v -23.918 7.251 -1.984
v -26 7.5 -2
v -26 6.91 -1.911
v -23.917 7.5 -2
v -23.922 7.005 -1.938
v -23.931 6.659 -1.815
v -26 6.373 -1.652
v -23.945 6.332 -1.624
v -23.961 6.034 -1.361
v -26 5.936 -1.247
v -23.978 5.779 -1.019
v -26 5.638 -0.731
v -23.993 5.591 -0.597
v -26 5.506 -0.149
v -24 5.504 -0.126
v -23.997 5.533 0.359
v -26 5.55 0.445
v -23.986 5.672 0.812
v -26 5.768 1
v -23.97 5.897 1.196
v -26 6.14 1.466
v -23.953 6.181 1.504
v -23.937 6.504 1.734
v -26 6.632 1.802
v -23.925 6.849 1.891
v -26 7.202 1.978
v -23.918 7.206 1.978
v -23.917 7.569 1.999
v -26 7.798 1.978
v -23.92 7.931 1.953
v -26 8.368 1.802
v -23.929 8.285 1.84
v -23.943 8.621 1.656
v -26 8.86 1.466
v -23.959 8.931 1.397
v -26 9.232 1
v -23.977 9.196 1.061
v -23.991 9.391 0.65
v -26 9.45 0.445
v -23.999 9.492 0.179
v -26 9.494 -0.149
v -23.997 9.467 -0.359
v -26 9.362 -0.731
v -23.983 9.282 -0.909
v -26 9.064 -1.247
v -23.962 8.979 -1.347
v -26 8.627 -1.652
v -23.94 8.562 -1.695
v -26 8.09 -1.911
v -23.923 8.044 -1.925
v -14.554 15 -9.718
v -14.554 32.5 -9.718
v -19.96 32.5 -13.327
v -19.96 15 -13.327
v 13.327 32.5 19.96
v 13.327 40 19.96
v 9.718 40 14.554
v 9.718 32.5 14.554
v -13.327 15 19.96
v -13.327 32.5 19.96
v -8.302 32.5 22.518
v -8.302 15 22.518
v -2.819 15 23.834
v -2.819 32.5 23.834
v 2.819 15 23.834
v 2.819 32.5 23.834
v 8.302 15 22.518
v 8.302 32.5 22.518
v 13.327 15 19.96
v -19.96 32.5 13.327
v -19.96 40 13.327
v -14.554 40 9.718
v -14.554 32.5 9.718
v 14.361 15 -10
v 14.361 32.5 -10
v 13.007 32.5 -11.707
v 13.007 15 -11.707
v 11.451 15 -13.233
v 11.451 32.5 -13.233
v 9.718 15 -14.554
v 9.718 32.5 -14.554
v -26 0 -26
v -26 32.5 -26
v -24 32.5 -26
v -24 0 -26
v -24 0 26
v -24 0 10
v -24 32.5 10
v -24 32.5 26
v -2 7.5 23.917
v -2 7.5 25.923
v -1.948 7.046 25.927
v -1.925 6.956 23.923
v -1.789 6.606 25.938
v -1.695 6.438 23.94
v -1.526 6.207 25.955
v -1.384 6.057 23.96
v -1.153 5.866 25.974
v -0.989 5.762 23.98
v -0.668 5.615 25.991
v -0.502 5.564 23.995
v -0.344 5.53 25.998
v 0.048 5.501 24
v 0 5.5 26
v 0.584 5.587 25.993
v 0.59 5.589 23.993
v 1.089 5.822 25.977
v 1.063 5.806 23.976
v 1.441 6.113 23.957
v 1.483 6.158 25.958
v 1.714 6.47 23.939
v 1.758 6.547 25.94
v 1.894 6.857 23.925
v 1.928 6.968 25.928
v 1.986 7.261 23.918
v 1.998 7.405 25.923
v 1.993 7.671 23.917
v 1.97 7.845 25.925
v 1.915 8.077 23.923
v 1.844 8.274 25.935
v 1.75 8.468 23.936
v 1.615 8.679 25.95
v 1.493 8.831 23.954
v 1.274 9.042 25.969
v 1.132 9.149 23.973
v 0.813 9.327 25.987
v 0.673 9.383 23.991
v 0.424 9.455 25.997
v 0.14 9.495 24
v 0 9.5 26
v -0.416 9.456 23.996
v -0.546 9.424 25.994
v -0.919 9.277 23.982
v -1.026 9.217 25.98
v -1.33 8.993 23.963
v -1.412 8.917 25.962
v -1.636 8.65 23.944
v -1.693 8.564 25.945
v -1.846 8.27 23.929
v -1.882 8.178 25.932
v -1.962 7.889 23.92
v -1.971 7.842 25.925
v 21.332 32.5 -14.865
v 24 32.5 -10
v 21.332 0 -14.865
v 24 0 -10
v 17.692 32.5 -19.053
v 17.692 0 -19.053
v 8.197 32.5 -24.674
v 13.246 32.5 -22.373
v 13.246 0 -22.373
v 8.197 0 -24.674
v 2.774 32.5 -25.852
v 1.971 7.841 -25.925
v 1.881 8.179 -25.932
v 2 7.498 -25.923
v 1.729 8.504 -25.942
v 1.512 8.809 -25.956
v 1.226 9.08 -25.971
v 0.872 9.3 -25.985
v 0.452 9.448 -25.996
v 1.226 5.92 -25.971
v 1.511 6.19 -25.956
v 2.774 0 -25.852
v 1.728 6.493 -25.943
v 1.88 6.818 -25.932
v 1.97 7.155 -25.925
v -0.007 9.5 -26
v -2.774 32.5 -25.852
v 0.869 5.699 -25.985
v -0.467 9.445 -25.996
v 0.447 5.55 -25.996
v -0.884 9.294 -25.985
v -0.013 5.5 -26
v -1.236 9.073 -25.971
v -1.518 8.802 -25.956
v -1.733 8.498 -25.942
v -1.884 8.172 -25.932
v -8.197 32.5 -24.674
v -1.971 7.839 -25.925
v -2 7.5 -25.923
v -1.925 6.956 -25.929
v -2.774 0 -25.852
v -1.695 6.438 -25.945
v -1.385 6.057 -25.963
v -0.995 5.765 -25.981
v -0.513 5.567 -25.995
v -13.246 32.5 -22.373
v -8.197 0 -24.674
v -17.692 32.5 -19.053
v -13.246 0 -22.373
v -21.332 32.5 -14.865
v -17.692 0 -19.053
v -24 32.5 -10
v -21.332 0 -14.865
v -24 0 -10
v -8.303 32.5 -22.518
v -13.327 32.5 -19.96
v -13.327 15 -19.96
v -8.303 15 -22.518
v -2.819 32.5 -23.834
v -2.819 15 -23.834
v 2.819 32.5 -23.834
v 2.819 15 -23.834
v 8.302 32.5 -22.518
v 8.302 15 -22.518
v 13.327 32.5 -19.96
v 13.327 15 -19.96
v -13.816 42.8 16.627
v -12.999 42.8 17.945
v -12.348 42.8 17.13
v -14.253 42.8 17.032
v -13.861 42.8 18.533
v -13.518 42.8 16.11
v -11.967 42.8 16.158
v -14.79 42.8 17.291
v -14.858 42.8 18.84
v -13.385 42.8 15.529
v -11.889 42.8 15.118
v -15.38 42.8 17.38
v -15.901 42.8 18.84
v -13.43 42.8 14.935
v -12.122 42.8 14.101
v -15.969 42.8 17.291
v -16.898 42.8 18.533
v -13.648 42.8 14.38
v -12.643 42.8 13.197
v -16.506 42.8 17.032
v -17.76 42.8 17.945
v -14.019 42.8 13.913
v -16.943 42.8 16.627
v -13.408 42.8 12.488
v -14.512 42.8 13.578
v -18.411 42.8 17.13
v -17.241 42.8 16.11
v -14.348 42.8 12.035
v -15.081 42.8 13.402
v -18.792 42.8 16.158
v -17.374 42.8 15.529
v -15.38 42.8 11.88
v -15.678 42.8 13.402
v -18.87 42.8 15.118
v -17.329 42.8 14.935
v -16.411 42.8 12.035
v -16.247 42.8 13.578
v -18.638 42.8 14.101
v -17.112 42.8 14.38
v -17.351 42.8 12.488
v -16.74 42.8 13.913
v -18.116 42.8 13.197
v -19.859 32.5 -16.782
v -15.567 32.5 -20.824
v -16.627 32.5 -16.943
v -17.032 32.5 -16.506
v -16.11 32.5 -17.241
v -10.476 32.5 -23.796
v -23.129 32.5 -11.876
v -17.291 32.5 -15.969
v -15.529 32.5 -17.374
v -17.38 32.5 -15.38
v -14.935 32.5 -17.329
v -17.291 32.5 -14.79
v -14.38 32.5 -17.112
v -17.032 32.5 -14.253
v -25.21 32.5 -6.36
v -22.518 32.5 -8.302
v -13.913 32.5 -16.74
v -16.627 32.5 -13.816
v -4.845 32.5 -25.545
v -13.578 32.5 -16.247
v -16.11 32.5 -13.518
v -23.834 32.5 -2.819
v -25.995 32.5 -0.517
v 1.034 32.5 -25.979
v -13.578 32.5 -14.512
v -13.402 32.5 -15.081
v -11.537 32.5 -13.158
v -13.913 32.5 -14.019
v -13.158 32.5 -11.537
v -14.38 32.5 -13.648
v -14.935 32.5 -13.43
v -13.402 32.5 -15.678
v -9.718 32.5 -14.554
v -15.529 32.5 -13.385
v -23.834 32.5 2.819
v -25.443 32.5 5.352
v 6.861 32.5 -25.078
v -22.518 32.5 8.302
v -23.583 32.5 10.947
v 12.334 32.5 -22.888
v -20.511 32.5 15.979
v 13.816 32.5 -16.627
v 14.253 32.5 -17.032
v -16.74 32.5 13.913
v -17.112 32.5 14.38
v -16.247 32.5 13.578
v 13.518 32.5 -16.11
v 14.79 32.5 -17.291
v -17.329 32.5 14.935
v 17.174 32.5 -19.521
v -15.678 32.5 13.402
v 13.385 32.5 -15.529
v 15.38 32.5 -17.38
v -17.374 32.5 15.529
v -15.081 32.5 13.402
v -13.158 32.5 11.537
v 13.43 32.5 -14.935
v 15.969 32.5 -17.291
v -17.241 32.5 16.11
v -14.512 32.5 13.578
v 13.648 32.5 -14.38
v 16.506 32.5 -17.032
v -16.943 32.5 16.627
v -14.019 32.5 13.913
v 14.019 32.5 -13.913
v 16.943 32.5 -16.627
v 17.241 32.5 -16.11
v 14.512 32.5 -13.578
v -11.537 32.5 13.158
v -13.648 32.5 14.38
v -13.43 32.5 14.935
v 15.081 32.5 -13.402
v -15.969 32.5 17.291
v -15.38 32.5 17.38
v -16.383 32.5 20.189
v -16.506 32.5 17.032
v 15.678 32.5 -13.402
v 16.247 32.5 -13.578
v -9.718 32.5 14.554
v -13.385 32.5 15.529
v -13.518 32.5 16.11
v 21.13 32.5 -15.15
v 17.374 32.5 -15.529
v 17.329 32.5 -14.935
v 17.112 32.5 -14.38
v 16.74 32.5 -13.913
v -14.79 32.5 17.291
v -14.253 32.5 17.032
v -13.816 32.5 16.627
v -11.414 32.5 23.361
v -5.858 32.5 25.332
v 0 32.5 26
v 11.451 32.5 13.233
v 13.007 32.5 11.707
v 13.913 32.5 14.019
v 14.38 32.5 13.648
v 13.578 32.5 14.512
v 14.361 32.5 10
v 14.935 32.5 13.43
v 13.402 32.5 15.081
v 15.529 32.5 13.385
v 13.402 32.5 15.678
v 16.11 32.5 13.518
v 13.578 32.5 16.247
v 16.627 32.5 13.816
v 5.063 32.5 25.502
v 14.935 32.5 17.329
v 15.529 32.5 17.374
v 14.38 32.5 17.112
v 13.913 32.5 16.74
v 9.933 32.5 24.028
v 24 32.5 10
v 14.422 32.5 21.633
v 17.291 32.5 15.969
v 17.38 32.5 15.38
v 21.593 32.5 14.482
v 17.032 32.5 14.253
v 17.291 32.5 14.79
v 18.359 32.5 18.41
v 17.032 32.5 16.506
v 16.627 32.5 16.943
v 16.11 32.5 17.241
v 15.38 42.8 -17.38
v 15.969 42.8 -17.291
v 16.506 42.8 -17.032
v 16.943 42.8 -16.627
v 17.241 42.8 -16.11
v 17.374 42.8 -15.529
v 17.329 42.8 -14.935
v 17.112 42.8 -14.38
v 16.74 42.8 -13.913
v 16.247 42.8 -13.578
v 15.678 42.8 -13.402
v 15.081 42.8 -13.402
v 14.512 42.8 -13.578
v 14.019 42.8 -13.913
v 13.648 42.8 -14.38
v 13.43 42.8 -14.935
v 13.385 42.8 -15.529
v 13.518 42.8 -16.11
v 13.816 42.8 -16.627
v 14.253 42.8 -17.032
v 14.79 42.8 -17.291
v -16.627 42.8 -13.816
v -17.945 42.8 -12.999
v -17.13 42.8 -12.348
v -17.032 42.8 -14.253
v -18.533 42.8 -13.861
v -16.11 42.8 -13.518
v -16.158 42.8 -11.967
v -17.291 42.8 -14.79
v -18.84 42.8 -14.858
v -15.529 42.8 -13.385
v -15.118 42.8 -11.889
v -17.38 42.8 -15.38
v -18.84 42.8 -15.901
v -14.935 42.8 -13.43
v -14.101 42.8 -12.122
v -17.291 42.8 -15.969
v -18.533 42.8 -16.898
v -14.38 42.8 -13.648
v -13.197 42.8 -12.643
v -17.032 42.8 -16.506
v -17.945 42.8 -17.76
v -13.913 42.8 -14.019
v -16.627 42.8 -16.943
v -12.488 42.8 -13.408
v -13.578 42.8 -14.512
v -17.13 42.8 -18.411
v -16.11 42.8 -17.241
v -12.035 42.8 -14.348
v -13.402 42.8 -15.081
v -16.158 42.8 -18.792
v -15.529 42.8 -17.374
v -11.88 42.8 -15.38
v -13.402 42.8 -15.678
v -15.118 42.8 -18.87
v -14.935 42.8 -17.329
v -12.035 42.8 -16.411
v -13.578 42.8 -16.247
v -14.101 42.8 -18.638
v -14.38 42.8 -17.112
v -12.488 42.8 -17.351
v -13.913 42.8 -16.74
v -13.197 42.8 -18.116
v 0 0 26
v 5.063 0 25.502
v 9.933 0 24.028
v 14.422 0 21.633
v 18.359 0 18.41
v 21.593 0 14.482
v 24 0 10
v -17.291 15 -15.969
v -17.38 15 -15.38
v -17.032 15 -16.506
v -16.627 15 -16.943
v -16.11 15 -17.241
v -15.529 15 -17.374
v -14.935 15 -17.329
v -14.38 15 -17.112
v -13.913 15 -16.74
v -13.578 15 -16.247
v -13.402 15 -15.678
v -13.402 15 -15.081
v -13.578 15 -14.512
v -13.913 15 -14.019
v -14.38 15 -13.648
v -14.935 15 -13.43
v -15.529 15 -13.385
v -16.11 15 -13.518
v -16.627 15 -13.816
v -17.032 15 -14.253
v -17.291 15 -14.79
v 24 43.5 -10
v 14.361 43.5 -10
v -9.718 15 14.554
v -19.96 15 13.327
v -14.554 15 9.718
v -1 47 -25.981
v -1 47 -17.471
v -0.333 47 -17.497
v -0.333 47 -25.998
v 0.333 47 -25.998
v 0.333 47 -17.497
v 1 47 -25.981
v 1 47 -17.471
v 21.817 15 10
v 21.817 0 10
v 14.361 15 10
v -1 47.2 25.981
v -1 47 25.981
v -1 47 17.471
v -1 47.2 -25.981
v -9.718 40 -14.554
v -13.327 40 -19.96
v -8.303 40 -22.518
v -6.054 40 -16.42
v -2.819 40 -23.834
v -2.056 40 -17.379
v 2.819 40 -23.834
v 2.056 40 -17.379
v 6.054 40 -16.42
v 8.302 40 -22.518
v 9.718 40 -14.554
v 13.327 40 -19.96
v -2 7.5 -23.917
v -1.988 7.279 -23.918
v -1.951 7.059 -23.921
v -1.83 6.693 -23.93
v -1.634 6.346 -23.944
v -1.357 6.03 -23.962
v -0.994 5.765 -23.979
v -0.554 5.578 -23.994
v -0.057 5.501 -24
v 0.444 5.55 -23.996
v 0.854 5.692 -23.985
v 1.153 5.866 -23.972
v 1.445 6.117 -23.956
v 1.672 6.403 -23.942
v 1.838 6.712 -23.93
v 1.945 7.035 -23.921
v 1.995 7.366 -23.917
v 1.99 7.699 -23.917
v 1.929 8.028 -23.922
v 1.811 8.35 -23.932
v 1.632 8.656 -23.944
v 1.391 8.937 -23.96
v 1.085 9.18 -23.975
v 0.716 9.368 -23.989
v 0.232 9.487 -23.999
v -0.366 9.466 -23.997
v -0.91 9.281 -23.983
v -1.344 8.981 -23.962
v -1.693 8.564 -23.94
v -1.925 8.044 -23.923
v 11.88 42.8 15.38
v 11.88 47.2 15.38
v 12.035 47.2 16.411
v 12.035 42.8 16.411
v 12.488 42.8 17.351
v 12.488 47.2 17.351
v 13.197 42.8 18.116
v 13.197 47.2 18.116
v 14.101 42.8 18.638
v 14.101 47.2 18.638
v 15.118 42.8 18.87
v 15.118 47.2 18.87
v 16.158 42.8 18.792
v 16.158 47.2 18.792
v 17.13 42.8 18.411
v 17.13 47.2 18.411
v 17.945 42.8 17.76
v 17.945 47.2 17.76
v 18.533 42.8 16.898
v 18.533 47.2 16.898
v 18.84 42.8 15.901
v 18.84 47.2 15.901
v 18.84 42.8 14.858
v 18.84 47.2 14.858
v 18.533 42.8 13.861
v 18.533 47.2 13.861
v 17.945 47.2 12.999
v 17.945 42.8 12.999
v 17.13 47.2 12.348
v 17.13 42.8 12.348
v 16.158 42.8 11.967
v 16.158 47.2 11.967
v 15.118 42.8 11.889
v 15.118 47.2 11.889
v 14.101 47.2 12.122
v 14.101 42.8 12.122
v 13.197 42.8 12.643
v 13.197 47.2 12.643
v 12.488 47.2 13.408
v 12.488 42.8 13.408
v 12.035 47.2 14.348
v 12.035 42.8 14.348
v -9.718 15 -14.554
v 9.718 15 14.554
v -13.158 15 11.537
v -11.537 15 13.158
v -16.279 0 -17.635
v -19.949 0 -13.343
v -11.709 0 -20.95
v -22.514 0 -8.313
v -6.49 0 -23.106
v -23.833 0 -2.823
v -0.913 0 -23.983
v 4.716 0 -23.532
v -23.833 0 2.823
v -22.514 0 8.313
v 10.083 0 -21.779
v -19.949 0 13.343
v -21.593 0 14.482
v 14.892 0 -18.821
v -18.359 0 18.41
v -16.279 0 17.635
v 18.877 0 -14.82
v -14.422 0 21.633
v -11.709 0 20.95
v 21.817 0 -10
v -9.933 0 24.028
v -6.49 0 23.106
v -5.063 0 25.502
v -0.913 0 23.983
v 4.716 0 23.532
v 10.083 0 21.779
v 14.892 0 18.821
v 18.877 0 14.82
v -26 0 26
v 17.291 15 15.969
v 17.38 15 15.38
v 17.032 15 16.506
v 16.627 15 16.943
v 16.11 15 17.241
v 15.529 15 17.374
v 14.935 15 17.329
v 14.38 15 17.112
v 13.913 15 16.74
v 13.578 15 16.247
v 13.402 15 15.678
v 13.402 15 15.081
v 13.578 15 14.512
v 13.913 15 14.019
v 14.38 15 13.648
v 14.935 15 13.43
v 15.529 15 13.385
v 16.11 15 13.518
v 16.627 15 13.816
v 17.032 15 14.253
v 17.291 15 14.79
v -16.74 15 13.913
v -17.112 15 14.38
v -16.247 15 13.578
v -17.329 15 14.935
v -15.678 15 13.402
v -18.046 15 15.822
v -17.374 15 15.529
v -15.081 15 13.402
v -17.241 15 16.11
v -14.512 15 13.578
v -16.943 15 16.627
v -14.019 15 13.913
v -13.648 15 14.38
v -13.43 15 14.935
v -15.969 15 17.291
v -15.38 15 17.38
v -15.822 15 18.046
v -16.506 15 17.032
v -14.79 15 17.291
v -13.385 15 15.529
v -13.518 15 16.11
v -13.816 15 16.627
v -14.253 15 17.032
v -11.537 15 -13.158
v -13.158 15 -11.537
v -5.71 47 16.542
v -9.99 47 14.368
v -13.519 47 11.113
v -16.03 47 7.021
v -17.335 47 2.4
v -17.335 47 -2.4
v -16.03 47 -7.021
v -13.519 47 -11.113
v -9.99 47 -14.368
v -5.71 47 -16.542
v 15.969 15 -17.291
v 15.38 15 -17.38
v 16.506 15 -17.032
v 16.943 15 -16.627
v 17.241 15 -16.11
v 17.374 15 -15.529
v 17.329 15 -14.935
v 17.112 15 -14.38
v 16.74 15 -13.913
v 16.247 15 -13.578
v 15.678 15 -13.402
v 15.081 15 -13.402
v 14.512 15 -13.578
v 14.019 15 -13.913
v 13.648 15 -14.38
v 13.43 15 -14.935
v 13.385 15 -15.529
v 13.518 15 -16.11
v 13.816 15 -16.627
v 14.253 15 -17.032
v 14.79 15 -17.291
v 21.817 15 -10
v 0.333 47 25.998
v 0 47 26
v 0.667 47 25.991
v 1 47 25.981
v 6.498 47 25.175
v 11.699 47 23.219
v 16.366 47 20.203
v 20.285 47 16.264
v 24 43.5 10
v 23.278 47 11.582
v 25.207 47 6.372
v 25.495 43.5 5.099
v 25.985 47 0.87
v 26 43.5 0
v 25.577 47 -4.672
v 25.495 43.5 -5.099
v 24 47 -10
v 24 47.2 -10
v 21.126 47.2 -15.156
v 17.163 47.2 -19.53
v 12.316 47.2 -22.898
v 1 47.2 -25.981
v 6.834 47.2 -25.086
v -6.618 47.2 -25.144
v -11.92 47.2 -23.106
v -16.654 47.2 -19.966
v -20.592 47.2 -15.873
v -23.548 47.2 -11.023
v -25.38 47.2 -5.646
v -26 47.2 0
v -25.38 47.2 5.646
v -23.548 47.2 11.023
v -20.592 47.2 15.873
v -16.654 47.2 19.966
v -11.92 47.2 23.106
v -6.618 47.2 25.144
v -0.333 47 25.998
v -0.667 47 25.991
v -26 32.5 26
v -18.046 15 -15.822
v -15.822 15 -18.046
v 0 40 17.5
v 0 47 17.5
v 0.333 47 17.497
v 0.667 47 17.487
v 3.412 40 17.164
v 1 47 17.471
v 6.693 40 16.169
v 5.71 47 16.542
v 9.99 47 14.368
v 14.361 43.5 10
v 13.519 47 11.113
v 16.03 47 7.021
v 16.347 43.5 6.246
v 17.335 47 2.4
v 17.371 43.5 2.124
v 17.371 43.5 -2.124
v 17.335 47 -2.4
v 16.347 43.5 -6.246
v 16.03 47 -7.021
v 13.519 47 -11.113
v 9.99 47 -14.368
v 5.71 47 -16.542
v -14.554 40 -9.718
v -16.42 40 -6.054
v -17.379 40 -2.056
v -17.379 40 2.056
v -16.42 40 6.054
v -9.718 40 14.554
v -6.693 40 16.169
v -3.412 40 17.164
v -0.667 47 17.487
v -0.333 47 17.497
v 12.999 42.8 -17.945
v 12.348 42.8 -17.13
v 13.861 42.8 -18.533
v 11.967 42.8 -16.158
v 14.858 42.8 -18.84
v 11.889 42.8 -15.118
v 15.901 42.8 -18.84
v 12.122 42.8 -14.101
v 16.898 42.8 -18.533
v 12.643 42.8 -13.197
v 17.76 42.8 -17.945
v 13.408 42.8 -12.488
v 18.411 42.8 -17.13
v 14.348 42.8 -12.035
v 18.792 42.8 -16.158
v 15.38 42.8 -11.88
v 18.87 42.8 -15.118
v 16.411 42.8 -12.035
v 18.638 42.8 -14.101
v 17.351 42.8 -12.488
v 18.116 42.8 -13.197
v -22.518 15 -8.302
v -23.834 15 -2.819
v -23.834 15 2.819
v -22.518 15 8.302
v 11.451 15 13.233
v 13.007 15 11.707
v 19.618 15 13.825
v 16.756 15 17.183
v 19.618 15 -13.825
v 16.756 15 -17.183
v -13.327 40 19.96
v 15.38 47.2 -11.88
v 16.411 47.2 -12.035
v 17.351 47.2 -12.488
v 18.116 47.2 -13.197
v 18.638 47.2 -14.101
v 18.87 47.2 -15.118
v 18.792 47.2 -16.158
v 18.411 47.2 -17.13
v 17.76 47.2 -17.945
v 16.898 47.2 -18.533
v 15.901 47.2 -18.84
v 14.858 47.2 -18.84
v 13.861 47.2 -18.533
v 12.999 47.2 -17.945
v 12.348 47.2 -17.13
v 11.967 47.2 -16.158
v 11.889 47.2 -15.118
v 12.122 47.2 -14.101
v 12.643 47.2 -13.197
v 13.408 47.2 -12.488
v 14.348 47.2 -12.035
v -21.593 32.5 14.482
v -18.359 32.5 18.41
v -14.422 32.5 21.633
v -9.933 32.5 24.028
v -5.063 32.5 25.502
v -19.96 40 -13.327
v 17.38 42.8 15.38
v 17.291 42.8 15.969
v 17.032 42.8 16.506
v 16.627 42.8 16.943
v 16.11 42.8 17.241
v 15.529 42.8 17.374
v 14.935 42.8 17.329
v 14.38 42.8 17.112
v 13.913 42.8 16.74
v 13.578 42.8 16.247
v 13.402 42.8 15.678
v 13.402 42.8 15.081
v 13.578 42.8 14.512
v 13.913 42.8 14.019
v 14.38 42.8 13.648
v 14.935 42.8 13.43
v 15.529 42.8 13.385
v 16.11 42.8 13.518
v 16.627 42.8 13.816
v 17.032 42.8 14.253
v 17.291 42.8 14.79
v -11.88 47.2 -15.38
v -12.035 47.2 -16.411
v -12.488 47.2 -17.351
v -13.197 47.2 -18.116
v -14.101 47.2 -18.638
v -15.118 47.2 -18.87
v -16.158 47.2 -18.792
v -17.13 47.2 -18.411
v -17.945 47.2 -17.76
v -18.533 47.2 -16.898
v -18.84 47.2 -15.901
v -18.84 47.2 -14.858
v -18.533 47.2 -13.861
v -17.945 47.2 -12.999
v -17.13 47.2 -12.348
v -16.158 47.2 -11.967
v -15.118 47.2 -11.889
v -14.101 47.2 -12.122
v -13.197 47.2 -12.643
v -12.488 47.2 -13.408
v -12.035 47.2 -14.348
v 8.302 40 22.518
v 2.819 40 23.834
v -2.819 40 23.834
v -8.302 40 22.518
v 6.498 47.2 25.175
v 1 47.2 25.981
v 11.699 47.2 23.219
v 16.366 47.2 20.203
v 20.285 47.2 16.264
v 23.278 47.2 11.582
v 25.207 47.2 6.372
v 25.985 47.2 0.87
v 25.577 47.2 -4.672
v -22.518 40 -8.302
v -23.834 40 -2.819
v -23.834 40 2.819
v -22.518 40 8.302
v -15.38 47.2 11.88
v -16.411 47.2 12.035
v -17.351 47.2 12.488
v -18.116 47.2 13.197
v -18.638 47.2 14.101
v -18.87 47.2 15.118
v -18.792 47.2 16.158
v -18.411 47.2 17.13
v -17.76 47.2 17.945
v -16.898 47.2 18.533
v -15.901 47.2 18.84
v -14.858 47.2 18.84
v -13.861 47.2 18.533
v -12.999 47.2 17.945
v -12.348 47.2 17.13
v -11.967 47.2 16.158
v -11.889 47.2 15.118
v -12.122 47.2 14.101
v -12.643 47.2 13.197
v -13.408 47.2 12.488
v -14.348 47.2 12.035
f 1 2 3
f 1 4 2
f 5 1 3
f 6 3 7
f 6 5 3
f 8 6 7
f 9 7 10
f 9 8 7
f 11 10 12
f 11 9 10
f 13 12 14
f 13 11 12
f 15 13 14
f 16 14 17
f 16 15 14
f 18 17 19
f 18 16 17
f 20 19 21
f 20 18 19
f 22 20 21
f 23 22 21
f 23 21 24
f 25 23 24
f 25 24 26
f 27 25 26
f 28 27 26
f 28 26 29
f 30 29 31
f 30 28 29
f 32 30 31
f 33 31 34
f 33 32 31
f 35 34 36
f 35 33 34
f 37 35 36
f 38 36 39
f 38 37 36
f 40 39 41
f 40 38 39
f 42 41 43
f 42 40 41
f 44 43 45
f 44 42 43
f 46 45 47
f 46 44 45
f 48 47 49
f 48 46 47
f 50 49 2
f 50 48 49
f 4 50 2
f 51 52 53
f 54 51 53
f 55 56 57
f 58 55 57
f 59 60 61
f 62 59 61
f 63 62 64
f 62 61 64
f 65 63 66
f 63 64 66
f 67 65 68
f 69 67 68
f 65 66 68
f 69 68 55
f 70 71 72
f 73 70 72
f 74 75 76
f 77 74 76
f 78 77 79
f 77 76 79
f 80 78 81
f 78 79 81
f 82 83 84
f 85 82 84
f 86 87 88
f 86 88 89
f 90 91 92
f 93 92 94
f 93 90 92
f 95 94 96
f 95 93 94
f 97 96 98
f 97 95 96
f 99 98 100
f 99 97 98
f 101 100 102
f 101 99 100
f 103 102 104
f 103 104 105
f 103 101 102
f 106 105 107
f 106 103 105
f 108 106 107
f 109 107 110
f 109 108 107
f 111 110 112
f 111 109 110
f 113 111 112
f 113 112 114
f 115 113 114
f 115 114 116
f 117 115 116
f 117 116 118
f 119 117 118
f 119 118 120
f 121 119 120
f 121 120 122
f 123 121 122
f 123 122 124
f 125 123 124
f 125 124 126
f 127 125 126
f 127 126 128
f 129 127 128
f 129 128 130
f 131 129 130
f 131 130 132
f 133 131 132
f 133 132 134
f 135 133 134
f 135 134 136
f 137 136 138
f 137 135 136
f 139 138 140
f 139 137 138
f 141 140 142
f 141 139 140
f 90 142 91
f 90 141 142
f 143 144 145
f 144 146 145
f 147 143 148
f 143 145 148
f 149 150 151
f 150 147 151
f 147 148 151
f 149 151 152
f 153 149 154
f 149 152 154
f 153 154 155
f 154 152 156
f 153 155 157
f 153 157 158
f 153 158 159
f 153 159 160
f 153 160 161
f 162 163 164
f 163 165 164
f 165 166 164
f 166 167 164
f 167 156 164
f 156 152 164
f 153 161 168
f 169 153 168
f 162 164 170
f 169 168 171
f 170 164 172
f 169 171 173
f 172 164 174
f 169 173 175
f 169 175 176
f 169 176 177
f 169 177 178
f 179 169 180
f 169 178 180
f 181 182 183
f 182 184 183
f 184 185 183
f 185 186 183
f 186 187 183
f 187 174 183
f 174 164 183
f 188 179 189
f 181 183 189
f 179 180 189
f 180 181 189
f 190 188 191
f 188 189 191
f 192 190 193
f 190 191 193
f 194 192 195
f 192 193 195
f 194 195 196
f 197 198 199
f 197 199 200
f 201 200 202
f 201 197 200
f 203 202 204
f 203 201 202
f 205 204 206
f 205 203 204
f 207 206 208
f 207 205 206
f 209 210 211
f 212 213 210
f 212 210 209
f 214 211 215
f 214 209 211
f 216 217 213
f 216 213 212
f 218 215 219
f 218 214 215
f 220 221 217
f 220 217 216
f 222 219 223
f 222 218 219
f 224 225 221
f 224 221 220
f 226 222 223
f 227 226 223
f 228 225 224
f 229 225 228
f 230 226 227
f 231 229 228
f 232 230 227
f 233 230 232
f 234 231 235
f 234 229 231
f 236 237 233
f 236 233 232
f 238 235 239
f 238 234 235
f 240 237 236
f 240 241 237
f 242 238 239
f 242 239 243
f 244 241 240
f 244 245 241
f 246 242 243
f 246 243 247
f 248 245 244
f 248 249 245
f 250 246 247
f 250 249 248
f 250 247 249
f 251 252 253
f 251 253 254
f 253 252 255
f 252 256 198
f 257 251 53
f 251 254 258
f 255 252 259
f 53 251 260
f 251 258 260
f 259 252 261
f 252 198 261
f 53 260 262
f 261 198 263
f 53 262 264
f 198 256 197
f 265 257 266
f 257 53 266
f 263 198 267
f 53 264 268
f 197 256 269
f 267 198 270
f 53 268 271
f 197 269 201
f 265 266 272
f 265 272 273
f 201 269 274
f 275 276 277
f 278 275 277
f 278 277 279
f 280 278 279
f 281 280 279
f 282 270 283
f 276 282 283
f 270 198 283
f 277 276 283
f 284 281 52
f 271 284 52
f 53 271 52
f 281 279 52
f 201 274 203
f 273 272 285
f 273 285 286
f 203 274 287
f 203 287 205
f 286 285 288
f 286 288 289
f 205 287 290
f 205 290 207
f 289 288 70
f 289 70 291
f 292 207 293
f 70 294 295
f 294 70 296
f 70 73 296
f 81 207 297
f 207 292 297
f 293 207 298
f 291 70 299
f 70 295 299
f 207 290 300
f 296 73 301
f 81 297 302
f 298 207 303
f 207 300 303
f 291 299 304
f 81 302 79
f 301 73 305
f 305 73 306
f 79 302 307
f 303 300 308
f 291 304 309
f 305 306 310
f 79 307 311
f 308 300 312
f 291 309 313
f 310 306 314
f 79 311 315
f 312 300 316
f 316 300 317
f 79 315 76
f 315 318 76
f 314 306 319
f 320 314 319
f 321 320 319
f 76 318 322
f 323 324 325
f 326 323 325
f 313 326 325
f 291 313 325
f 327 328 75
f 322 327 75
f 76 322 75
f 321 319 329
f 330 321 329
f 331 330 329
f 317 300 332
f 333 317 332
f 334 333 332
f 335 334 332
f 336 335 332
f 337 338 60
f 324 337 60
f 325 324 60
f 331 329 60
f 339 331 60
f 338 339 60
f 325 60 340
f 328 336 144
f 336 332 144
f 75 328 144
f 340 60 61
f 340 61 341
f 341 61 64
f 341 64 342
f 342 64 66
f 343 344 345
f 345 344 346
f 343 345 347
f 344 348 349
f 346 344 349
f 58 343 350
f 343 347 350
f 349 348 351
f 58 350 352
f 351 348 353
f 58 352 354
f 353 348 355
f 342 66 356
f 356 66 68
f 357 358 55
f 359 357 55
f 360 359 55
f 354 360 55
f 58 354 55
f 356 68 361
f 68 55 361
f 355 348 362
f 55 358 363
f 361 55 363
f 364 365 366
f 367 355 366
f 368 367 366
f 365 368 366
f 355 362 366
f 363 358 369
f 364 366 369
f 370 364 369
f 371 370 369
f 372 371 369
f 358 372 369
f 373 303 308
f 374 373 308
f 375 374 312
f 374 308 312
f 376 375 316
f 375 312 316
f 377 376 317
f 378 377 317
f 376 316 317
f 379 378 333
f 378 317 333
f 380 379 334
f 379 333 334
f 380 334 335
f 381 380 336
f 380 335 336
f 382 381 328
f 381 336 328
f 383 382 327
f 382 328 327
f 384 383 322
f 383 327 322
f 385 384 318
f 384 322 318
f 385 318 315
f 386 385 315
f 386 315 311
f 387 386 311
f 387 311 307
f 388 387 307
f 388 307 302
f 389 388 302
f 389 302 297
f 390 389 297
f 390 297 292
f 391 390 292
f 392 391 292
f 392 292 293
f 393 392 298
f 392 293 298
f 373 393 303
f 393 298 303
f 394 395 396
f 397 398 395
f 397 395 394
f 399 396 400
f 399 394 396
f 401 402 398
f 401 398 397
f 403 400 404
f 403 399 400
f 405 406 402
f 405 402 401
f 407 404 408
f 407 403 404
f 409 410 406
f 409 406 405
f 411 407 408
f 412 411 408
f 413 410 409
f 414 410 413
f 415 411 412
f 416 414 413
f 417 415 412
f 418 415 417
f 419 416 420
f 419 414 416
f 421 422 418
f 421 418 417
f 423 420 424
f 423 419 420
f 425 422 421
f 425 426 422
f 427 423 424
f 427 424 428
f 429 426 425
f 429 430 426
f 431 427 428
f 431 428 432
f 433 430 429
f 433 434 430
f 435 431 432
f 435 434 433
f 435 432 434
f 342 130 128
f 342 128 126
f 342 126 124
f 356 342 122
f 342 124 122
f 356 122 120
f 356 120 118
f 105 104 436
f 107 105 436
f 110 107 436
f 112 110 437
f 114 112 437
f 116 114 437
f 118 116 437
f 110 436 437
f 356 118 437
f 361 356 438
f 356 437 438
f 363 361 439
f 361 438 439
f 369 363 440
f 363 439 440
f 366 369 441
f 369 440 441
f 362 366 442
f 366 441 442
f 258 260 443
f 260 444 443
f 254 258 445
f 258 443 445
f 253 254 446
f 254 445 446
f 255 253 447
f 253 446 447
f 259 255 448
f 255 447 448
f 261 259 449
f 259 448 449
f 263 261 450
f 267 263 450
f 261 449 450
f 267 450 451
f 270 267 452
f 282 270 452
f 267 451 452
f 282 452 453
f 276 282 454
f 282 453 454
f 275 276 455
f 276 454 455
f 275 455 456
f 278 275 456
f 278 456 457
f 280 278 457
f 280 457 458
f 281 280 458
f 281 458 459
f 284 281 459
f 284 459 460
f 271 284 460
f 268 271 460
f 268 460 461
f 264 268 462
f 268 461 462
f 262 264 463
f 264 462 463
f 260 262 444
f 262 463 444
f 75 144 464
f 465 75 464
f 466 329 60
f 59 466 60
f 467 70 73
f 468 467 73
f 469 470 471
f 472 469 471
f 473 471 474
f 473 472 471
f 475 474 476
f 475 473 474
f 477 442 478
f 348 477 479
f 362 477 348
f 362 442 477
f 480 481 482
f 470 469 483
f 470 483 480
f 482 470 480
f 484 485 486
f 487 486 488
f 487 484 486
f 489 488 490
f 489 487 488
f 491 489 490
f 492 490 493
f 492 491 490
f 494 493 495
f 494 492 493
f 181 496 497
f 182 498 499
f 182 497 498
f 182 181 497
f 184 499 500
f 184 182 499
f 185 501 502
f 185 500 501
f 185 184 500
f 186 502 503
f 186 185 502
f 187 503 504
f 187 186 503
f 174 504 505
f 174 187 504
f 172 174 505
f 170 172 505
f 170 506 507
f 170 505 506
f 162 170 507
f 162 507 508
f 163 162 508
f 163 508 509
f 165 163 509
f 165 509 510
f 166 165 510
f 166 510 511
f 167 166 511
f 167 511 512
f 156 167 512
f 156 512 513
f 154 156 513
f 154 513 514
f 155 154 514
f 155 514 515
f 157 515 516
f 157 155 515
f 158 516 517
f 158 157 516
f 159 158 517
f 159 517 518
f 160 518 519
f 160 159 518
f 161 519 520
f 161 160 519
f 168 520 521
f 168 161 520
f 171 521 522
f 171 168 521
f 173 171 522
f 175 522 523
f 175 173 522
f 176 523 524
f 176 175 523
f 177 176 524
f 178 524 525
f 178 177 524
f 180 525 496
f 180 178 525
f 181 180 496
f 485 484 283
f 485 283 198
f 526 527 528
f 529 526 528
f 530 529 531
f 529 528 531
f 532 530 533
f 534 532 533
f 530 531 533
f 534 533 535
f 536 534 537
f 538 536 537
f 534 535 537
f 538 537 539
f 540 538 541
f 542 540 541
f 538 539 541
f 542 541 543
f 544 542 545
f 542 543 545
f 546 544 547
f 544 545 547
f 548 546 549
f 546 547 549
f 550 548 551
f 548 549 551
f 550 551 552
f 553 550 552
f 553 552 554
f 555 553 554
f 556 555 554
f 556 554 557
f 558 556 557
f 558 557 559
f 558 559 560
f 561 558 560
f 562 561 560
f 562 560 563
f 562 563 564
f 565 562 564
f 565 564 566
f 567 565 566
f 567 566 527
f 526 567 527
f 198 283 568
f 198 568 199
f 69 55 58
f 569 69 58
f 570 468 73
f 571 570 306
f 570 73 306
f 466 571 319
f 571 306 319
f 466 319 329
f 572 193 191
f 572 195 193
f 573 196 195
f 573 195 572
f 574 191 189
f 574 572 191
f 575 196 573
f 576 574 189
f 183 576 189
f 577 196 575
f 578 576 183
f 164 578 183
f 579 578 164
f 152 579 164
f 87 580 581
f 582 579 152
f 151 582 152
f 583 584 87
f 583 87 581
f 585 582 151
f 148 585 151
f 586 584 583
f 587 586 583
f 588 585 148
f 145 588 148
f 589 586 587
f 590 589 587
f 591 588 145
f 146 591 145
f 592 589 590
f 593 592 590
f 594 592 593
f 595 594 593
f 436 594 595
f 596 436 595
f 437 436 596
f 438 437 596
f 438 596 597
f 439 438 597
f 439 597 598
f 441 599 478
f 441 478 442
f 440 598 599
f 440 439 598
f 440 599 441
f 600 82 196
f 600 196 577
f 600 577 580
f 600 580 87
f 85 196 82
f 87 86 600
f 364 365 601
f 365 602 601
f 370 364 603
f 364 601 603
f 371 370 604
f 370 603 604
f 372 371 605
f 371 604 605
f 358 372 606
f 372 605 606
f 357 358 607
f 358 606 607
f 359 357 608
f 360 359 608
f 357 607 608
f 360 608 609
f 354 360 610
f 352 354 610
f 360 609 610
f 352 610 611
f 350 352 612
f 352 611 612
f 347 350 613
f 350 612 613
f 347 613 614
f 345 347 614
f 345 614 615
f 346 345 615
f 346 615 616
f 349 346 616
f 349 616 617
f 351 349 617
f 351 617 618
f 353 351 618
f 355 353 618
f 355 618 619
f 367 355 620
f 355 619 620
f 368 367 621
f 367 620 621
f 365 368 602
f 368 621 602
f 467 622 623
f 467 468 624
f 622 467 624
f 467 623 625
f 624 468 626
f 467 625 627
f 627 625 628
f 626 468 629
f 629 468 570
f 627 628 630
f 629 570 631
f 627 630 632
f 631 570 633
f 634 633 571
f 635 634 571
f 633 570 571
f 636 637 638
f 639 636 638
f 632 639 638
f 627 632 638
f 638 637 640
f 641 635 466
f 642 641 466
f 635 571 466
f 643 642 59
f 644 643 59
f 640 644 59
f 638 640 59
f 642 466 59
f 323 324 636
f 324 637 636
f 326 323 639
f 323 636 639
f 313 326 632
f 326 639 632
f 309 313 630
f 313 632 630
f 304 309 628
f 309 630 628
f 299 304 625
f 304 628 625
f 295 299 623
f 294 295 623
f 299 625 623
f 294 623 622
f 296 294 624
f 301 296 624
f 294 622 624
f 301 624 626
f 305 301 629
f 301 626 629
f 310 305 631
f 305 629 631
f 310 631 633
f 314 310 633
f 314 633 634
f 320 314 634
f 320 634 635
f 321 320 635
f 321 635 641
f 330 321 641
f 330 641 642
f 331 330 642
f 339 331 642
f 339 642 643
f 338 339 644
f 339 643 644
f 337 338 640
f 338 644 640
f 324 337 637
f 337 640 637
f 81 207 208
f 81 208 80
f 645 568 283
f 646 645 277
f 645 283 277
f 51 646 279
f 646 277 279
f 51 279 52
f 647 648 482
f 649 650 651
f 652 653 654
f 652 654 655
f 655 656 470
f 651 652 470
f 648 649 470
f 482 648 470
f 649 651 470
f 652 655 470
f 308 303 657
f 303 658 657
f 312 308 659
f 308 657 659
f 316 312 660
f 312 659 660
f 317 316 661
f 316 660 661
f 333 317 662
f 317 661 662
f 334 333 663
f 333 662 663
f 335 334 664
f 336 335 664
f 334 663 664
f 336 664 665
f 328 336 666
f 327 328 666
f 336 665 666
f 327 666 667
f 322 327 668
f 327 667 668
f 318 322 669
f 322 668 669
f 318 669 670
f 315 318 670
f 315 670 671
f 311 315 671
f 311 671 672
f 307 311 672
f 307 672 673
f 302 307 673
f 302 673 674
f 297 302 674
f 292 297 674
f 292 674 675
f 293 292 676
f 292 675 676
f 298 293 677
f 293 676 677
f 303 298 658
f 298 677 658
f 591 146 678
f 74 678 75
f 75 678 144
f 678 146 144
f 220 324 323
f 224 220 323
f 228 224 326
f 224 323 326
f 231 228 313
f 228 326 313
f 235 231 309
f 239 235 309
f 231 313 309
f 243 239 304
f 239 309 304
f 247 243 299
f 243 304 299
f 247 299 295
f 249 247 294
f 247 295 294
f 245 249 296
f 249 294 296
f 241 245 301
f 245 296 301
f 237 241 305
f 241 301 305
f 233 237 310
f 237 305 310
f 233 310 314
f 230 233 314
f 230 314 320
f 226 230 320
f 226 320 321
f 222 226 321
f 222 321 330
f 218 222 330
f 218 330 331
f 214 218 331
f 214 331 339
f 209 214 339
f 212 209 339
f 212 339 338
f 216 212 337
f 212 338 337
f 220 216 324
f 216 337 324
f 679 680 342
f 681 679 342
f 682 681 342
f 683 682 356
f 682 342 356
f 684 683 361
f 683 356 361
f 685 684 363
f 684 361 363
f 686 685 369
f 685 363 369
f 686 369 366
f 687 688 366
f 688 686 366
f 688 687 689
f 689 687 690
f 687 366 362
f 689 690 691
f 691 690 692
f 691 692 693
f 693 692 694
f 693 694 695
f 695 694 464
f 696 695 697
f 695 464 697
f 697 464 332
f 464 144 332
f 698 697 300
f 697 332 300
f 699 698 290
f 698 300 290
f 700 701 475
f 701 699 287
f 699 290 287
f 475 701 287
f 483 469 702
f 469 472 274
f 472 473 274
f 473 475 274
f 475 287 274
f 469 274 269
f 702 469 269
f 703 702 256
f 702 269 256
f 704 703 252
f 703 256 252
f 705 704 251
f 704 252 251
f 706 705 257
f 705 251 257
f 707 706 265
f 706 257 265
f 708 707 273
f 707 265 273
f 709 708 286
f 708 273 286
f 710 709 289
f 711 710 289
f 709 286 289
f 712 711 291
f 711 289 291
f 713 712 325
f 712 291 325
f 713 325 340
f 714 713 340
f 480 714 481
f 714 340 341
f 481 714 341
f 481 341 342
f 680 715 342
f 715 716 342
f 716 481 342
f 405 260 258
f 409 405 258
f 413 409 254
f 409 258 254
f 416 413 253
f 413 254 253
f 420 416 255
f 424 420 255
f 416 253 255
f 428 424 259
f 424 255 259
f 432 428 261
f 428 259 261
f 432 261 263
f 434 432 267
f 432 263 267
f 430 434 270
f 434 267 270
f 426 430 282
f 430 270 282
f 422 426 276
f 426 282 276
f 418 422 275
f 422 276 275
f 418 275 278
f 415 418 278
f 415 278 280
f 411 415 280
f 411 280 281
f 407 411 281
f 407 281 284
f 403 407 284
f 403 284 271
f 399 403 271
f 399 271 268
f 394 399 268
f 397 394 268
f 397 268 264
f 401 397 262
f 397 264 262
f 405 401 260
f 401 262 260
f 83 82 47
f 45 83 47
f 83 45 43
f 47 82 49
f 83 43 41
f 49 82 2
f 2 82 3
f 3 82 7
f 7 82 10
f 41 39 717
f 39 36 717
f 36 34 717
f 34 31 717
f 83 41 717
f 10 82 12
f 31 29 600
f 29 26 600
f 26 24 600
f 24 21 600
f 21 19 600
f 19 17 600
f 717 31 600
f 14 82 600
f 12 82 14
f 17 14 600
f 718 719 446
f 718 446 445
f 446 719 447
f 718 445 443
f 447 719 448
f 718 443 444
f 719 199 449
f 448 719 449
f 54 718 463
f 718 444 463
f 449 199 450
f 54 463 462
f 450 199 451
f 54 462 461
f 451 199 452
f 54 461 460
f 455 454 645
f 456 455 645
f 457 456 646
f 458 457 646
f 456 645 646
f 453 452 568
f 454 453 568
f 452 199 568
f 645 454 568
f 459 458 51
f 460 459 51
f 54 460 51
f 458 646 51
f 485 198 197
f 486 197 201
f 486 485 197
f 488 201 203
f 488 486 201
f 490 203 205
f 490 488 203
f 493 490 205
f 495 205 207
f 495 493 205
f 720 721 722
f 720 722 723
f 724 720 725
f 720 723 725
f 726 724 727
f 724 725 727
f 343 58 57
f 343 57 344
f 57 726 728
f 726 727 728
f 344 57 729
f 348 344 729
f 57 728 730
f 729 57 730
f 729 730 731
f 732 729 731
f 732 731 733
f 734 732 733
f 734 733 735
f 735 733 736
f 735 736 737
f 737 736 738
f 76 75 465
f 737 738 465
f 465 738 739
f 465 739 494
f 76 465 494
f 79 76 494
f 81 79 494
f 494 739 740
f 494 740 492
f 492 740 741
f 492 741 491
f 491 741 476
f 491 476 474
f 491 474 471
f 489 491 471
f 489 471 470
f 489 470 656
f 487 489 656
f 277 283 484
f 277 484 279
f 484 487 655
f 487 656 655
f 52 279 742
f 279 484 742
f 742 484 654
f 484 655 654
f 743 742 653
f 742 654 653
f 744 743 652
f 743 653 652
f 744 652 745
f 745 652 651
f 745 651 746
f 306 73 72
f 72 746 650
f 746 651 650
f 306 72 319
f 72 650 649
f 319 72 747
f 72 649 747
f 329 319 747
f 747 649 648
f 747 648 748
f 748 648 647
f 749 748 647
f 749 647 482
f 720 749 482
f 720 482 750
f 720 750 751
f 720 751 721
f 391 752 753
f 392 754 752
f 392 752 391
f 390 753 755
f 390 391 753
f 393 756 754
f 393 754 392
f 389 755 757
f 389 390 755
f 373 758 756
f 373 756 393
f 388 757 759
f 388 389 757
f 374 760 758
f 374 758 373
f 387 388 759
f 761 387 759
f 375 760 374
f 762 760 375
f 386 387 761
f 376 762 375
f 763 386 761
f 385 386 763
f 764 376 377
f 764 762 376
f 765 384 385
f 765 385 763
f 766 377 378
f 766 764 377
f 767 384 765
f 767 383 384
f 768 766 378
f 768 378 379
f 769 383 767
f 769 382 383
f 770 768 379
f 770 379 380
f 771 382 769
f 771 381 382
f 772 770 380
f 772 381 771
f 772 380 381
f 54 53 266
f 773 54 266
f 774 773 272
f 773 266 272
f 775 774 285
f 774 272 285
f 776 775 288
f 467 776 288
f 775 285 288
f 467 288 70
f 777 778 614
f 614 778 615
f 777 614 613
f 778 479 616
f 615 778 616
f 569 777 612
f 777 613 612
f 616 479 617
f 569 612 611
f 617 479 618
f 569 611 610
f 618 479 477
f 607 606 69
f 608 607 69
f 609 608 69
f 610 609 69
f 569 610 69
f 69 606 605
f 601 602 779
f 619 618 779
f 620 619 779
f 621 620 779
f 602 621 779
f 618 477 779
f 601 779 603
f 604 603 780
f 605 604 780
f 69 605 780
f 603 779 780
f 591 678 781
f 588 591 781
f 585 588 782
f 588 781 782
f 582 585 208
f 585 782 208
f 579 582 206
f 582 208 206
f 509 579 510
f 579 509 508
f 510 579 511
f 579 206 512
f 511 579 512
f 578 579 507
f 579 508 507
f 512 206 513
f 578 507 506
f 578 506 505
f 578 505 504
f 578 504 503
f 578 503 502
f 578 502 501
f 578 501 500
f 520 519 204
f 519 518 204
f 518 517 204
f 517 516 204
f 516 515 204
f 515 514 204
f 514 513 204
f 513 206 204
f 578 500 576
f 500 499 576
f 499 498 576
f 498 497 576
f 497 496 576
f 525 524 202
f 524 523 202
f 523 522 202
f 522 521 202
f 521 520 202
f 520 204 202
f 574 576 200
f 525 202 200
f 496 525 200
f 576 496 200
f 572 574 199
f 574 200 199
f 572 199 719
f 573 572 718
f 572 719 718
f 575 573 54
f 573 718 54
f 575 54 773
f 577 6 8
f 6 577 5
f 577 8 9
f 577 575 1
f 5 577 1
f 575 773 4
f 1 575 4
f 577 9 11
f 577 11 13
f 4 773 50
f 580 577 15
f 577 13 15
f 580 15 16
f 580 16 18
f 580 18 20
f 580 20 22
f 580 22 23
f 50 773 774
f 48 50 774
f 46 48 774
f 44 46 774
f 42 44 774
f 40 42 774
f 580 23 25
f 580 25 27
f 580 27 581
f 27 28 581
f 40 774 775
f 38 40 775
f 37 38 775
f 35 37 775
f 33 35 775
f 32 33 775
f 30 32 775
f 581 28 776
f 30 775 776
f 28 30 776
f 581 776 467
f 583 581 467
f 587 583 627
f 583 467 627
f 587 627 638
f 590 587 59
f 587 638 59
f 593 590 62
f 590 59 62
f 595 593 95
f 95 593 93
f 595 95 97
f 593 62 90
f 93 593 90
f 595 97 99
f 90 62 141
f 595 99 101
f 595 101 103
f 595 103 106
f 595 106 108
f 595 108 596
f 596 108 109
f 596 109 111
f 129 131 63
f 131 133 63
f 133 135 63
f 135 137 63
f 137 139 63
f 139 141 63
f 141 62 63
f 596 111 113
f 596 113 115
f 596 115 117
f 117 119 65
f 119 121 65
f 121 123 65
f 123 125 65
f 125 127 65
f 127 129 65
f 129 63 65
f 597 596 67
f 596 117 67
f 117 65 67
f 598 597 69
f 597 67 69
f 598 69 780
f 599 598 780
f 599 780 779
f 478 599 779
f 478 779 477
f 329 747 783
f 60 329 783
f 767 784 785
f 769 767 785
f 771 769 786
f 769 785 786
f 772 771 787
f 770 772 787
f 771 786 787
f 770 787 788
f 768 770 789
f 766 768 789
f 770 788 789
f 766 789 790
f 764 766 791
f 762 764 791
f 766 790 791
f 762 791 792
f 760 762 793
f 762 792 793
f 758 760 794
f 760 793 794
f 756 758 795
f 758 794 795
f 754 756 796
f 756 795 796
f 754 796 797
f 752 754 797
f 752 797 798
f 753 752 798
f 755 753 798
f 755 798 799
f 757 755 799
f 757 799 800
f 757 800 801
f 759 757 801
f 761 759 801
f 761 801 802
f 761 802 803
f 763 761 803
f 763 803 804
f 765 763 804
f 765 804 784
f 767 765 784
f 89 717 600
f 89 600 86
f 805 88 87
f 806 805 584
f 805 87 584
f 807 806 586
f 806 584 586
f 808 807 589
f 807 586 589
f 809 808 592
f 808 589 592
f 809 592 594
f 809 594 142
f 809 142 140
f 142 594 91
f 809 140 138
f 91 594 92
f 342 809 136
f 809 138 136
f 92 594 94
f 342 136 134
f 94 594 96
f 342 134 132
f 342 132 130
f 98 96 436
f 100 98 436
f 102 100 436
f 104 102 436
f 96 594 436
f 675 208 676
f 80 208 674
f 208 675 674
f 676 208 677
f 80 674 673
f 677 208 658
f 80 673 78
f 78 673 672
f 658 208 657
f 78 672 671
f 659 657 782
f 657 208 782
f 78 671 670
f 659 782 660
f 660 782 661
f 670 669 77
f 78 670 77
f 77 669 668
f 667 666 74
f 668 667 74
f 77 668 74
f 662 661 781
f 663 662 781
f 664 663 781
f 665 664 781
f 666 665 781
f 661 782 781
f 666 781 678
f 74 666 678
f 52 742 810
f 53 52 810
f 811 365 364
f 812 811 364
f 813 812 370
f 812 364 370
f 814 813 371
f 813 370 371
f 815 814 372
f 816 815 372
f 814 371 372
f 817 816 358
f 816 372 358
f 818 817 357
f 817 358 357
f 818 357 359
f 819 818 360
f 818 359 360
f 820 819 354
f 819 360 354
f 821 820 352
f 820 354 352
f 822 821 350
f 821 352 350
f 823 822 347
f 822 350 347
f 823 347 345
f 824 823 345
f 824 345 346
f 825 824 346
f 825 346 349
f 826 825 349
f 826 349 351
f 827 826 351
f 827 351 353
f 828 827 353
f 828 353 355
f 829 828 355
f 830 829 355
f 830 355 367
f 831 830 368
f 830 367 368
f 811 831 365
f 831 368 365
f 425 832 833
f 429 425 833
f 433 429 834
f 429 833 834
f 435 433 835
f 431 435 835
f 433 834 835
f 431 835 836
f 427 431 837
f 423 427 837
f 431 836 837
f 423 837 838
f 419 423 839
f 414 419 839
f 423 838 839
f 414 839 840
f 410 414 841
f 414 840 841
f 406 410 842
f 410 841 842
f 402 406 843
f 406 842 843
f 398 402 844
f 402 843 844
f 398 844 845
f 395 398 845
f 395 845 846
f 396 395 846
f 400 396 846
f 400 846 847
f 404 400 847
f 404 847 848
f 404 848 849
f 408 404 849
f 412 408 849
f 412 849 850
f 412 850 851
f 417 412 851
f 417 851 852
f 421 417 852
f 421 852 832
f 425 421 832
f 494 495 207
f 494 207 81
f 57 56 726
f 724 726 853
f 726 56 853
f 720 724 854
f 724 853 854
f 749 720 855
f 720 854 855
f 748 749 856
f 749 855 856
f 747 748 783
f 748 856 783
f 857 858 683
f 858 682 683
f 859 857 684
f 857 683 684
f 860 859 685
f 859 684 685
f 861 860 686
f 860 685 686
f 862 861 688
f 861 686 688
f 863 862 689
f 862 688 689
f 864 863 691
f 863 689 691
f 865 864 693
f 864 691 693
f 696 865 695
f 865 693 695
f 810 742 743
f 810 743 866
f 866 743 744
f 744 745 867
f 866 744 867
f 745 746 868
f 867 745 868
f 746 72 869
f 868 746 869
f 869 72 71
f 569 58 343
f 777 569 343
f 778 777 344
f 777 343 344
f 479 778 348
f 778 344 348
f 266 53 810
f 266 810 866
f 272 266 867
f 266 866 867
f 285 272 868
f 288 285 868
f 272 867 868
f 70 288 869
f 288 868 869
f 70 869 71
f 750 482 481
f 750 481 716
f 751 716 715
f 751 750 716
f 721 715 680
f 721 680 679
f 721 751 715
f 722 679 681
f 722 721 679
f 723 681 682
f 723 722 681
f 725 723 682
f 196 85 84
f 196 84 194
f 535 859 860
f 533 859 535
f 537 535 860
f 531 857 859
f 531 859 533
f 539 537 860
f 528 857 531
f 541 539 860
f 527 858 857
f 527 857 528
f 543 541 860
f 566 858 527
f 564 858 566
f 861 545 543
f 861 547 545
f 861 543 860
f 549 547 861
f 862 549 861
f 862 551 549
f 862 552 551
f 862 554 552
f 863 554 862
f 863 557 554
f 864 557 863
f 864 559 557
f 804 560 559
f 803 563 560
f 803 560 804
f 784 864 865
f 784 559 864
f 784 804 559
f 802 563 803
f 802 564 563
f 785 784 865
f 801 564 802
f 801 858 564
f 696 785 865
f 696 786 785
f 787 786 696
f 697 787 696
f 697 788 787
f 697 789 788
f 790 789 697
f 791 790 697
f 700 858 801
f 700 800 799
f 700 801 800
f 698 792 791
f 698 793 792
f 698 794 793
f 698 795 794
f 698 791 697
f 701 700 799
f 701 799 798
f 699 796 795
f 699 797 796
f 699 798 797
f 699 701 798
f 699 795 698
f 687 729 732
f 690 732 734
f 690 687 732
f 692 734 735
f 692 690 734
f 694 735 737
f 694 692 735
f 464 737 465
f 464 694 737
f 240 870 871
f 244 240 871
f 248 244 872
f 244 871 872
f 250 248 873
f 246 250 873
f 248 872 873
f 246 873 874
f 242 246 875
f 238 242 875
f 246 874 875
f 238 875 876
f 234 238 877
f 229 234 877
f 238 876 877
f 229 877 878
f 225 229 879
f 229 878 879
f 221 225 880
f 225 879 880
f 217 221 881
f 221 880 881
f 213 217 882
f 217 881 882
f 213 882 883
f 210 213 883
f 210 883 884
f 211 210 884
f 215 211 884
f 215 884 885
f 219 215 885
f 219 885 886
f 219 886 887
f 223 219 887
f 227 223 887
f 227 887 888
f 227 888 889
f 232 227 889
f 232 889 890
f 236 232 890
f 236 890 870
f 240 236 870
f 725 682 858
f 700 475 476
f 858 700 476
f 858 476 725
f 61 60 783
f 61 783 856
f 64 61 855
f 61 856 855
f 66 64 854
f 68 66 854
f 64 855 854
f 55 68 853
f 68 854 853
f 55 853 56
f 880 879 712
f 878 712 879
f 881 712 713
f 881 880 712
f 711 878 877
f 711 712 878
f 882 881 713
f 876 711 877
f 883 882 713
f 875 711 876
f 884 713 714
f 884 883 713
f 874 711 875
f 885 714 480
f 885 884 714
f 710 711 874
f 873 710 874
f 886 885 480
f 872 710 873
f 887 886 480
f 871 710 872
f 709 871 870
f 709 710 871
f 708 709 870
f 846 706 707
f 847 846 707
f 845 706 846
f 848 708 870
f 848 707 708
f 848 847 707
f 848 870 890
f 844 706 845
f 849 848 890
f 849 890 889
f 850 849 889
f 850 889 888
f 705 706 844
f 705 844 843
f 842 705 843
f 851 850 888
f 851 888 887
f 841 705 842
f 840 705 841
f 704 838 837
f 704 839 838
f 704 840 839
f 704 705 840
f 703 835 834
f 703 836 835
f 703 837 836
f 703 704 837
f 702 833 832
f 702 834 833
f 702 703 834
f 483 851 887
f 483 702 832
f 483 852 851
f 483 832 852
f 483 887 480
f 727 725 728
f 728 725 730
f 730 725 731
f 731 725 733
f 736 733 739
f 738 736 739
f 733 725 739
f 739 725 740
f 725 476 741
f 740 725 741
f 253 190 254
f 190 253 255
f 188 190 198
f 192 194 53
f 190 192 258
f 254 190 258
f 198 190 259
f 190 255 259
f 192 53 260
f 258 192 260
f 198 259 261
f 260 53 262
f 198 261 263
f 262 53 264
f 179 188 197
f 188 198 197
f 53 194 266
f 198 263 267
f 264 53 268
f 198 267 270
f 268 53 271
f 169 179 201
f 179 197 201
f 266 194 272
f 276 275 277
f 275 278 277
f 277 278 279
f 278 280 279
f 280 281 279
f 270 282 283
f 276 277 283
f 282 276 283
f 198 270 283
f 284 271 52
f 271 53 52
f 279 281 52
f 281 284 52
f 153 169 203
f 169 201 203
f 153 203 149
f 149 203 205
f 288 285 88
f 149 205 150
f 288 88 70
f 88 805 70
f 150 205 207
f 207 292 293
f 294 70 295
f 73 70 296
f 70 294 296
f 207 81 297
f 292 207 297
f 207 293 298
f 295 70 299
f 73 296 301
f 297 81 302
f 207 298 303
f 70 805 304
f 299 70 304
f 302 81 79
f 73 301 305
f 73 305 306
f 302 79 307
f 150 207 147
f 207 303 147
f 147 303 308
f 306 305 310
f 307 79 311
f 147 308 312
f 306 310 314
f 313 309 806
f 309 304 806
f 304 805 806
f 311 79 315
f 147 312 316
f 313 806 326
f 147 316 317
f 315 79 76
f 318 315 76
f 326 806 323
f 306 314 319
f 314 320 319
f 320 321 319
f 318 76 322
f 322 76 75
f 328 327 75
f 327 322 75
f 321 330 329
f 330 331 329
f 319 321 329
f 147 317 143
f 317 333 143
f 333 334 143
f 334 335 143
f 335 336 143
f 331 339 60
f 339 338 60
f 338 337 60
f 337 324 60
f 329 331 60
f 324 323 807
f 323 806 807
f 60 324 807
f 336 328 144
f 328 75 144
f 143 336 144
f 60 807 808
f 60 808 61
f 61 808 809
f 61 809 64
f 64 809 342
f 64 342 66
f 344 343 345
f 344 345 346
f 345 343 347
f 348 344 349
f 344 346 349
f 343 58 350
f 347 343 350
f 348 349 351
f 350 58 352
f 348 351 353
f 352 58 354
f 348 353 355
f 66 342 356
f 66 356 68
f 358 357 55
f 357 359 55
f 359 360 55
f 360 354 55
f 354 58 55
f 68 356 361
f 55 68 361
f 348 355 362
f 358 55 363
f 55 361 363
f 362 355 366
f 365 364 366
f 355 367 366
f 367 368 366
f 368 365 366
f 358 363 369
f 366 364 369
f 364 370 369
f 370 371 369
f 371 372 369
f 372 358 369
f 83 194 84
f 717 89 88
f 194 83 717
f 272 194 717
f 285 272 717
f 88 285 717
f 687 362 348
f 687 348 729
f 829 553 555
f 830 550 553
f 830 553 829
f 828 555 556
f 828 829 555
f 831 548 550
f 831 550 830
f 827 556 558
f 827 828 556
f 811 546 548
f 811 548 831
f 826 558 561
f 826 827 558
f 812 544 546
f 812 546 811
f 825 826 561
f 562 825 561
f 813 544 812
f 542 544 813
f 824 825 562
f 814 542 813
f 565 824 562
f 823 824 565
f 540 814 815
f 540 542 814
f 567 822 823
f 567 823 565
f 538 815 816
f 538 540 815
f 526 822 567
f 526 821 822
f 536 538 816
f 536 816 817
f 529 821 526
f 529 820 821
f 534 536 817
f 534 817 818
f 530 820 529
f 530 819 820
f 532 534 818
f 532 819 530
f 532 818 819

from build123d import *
from build123d.topology import SkipClean

# Parameters (mm, degrees)
SKETCH1_R                                           = 26
BOSS_EXTRUDE1_DEPTH                                 = 47
SKETCH2_R                                           = 17.5
CUT_EXTRUDE1_DEPTH                                  = 32
SKETCH3_R                                           = 24
CUT_EXTRUDE2_DEPTH                                  = 49.744230428
SKETCH11_W                                          = 20
SKETCH11_H                                          = 43.5
CUT_EXTRUDE3_DEPTH                                  = 15
SKETCH12_R                                          = 26
BOSS_EXTRUDE2_DEPTH                                 = 0.2
SKETCH26_W                                          = 2
SKETCH26_H                                          = 52
BOSS_EXTRUDE4_DEPTH                                 = 32.5
CIRPATTERN1_COUNT                                   = 4
CUT_EXTRUDE5_DEPTH                                  = 60.831764313
CUT_EXTRUDE5_DEPTH_BACK                             = 60.831764313
SKETCH35_W                                          = 2
SKETCH35_H                                          = 0.2
CBORE_FOR_M4_HEX_SOCKET_HEAD_CAP_SCREW2_D           = 4
CBORE_FOR_M4_HEX_SOCKET_HEAD_CAP_SCREW2_CBORE_D     = 7
CBORE_FOR_M4_HEX_SOCKET_HEAD_CAP_SCREW2_CBORE_DEPTH = 4.4
CIRPATTERN2_COUNT                                   = 4
CUT_EXTRUDE6_START                                  = -25
CUT_EXTRUDE6_DEPTH                                  = 25


with BuildPart() as part:
    # Sketch1 → Boss-Extrude1 (new body)
    with BuildSketch(Plane(origin=(0, 0, 0), x_dir=(1, 0, 0), z_dir=(0, 1, 0))):
        with Locations(Location((0, 0, 0), (0, 0, 270))):
            Circle(SKETCH1_R)
    extrude(amount=BOSS_EXTRUDE1_DEPTH)

    # Sketch2 → Cut-Extrude1 (cut)
    with BuildSketch(Plane(origin=(0, 47, 0), x_dir=(1, 0, 0), z_dir=(0, 1, 0))):
        with Locations(Location((0, 0, 0), (0, 0, 270))):
            Circle(SKETCH2_R)
    extrude(amount=-CUT_EXTRUDE1_DEPTH, mode=Mode.SUBTRACT)

    # Sketch3 → Cut-Extrude2 (cut, through all)
    with BuildSketch(Plane(origin=(0, 15, 0), x_dir=(1, 0, 0), z_dir=(0, 1, 0))):
        with Locations(Location((0, 0, 0), (0, 0, 270))):
            Circle(SKETCH3_R)
    extrude(amount=-CUT_EXTRUDE2_DEPTH, mode=Mode.SUBTRACT)

    # Sketch11 → Cut-Extrude3 (cut)
    with BuildSketch(Plane(origin=(26, 0, 0), x_dir=(0, 0, -1), z_dir=(1, 0, 0))):
        with Locations((0, 21.75)):
            Rectangle(SKETCH11_W, SKETCH11_H)
    extrude(amount=-CUT_EXTRUDE3_DEPTH, mode=Mode.SUBTRACT)

    # Sketch12 → Boss-Extrude2 (add)
    with BuildSketch(Plane(origin=(0, 47, 0), x_dir=(1, 0, 0), z_dir=(0, 1, 0))):
        with Locations(Location((0, 0, 0), (0, 0, 22.619864948))):
            Circle(SKETCH12_R)
    extrude(amount=BOSS_EXTRUDE2_DEPTH)

    # Sketch26 → Boss-Extrude4 (add)
    with BuildSketch(Plane.XZ):
        with Locations((-25, 0)):
            Rectangle(SKETCH26_W, SKETCH26_H)
    extrude(amount=-BOSS_EXTRUDE4_DEPTH)

    # Sketch5 → Ø4.0mm Dowel Hole1 (revolve, cut)
    with BuildSketch(Plane(origin=(26, 7.5, 0), x_dir=(0, 0, -1), z_dir=(0, 1, 0))):
        Polygon((0, 0), (0, 53.201721238), (2, 52), (2, 0), align=None)
    f_4_0mm_dowel_hole1 = revolve(axis=Axis((32.35, 7.5, 0), (-1, 0, 0)), mode=Mode.SUBTRACT)

    # CirPattern1: Ø4.0mm Dowel Hole1 ×4 about axis
    cirpattern1_axis = Axis((0, 0, 0), (0, 1, 0))
    for i in range(1, CIRPATTERN1_COUNT):
        add(f_4_0mm_dowel_hole1.rotate(cirpattern1_axis, i * 360 / CIRPATTERN1_COUNT), mode=Mode.SUBTRACT)

    # Sketch35 → Cut-Extrude5 (cut, two sides: drawn at the far end of the back side and taken through both)
    with BuildSketch(Plane.XY.offset(-CUT_EXTRUDE5_DEPTH_BACK)):
        with Locations((0, 47.1)):
            Rectangle(SKETCH35_W, SKETCH35_H)
    extrude(amount=CUT_EXTRUDE5_DEPTH + CUT_EXTRUDE5_DEPTH_BACK, mode=Mode.SUBTRACT)

    # CBORE for M4 Hex Socket Head Cap Screw2 (through all)
    with Locations(Plane(origin=(0, 47.2, 0), x_dir=(1, 0, 0), z_dir=(0, 1, 0))):
        with Locations((-15.379572491, 15.379572491)):
            cbore_for_m4_hex_socket_head_cap_screw2 = CounterBoreHole(CBORE_FOR_M4_HEX_SOCKET_HEAD_CAP_SCREW2_D / 2, CBORE_FOR_M4_HEX_SOCKET_HEAD_CAP_SCREW2_CBORE_D / 2, CBORE_FOR_M4_HEX_SOCKET_HEAD_CAP_SCREW2_CBORE_DEPTH)

    # CirPattern2: CBORE for M4 Hex Socket Head Cap Screw2 ×4 about axis
    cirpattern2_axis = Axis((0, 0, 0), (0, 1, 0))
    for i in range(1, CIRPATTERN2_COUNT):
        add(cbore_for_m4_hex_socket_head_cap_screw2.rotate(cirpattern2_axis, i * 360 / CIRPATTERN2_COUNT), mode=Mode.SUBTRACT)

    # Sketch41 → Cut-Extrude6 (cut)
    with SkipClean():  # the faces are left unmerged after this step: merging them gives an invalid solid
        with BuildSketch(Plane.XZ.offset(-15).offset(CUT_EXTRUDE6_START)):
            with BuildLine():
                Line((-9.717729156, 14.553890891), (-13.327171414, 19.959621793))
                ThreePointArc((-13.327171414, 19.959621793), (1e-09, 24), (13.327171415, 19.959621792))
                Line((13.327171415, 19.959621792), (9.717729157, 14.55389089))
                ThreePointArc((9.717729157, 14.55389089), (1e-09, 17.5), (-9.717729156, 14.553890891))
            make_face()
            with BuildLine():
                Line((-9.717810502, -14.553836575), (-13.327282975, -19.959547302))
                ThreePointArc((-13.327282975, -19.959547302), (-6.7072e-05, -24), (13.327171414, -19.959621793))
                Line((13.327171414, -19.959621793), (9.717729156, -14.553890891))
                ThreePointArc((9.717729156, -14.553890891), (-4.8907e-05, -17.5), (-9.717810502, -14.553836575))
            make_face()
            with BuildLine():
                Line((-14.55389089, -9.717729157), (-19.959621792, -13.327171415))
                ThreePointArc((-19.959621792, -13.327171415), (-24, -1e-09), (-19.959621793, 13.327171414))
                Line((-19.959621793, 13.327171414), (-14.553890891, 9.717729156))
                ThreePointArc((-14.553890891, 9.717729156), (-17.5, -1e-09), (-14.55389089, -9.717729157))
            make_face()
        extrude(amount=CUT_EXTRUDE6_DEPTH, mode=Mode.SUBTRACT)


with BuildPart() as body_2:
    # Split2: the piece on the far side of the plane
    add(part.part)
    split(bisect_by=Plane.ZX.offset(32.5), keep=Keep.BOTTOM)


with BuildPart() as part_1:
    add(part.part)

    # Split2
    split(bisect_by=Plane.ZX.offset(32.5), keep=Keep.TOP)


solid = Compound([body_2.part, part_1.part])
